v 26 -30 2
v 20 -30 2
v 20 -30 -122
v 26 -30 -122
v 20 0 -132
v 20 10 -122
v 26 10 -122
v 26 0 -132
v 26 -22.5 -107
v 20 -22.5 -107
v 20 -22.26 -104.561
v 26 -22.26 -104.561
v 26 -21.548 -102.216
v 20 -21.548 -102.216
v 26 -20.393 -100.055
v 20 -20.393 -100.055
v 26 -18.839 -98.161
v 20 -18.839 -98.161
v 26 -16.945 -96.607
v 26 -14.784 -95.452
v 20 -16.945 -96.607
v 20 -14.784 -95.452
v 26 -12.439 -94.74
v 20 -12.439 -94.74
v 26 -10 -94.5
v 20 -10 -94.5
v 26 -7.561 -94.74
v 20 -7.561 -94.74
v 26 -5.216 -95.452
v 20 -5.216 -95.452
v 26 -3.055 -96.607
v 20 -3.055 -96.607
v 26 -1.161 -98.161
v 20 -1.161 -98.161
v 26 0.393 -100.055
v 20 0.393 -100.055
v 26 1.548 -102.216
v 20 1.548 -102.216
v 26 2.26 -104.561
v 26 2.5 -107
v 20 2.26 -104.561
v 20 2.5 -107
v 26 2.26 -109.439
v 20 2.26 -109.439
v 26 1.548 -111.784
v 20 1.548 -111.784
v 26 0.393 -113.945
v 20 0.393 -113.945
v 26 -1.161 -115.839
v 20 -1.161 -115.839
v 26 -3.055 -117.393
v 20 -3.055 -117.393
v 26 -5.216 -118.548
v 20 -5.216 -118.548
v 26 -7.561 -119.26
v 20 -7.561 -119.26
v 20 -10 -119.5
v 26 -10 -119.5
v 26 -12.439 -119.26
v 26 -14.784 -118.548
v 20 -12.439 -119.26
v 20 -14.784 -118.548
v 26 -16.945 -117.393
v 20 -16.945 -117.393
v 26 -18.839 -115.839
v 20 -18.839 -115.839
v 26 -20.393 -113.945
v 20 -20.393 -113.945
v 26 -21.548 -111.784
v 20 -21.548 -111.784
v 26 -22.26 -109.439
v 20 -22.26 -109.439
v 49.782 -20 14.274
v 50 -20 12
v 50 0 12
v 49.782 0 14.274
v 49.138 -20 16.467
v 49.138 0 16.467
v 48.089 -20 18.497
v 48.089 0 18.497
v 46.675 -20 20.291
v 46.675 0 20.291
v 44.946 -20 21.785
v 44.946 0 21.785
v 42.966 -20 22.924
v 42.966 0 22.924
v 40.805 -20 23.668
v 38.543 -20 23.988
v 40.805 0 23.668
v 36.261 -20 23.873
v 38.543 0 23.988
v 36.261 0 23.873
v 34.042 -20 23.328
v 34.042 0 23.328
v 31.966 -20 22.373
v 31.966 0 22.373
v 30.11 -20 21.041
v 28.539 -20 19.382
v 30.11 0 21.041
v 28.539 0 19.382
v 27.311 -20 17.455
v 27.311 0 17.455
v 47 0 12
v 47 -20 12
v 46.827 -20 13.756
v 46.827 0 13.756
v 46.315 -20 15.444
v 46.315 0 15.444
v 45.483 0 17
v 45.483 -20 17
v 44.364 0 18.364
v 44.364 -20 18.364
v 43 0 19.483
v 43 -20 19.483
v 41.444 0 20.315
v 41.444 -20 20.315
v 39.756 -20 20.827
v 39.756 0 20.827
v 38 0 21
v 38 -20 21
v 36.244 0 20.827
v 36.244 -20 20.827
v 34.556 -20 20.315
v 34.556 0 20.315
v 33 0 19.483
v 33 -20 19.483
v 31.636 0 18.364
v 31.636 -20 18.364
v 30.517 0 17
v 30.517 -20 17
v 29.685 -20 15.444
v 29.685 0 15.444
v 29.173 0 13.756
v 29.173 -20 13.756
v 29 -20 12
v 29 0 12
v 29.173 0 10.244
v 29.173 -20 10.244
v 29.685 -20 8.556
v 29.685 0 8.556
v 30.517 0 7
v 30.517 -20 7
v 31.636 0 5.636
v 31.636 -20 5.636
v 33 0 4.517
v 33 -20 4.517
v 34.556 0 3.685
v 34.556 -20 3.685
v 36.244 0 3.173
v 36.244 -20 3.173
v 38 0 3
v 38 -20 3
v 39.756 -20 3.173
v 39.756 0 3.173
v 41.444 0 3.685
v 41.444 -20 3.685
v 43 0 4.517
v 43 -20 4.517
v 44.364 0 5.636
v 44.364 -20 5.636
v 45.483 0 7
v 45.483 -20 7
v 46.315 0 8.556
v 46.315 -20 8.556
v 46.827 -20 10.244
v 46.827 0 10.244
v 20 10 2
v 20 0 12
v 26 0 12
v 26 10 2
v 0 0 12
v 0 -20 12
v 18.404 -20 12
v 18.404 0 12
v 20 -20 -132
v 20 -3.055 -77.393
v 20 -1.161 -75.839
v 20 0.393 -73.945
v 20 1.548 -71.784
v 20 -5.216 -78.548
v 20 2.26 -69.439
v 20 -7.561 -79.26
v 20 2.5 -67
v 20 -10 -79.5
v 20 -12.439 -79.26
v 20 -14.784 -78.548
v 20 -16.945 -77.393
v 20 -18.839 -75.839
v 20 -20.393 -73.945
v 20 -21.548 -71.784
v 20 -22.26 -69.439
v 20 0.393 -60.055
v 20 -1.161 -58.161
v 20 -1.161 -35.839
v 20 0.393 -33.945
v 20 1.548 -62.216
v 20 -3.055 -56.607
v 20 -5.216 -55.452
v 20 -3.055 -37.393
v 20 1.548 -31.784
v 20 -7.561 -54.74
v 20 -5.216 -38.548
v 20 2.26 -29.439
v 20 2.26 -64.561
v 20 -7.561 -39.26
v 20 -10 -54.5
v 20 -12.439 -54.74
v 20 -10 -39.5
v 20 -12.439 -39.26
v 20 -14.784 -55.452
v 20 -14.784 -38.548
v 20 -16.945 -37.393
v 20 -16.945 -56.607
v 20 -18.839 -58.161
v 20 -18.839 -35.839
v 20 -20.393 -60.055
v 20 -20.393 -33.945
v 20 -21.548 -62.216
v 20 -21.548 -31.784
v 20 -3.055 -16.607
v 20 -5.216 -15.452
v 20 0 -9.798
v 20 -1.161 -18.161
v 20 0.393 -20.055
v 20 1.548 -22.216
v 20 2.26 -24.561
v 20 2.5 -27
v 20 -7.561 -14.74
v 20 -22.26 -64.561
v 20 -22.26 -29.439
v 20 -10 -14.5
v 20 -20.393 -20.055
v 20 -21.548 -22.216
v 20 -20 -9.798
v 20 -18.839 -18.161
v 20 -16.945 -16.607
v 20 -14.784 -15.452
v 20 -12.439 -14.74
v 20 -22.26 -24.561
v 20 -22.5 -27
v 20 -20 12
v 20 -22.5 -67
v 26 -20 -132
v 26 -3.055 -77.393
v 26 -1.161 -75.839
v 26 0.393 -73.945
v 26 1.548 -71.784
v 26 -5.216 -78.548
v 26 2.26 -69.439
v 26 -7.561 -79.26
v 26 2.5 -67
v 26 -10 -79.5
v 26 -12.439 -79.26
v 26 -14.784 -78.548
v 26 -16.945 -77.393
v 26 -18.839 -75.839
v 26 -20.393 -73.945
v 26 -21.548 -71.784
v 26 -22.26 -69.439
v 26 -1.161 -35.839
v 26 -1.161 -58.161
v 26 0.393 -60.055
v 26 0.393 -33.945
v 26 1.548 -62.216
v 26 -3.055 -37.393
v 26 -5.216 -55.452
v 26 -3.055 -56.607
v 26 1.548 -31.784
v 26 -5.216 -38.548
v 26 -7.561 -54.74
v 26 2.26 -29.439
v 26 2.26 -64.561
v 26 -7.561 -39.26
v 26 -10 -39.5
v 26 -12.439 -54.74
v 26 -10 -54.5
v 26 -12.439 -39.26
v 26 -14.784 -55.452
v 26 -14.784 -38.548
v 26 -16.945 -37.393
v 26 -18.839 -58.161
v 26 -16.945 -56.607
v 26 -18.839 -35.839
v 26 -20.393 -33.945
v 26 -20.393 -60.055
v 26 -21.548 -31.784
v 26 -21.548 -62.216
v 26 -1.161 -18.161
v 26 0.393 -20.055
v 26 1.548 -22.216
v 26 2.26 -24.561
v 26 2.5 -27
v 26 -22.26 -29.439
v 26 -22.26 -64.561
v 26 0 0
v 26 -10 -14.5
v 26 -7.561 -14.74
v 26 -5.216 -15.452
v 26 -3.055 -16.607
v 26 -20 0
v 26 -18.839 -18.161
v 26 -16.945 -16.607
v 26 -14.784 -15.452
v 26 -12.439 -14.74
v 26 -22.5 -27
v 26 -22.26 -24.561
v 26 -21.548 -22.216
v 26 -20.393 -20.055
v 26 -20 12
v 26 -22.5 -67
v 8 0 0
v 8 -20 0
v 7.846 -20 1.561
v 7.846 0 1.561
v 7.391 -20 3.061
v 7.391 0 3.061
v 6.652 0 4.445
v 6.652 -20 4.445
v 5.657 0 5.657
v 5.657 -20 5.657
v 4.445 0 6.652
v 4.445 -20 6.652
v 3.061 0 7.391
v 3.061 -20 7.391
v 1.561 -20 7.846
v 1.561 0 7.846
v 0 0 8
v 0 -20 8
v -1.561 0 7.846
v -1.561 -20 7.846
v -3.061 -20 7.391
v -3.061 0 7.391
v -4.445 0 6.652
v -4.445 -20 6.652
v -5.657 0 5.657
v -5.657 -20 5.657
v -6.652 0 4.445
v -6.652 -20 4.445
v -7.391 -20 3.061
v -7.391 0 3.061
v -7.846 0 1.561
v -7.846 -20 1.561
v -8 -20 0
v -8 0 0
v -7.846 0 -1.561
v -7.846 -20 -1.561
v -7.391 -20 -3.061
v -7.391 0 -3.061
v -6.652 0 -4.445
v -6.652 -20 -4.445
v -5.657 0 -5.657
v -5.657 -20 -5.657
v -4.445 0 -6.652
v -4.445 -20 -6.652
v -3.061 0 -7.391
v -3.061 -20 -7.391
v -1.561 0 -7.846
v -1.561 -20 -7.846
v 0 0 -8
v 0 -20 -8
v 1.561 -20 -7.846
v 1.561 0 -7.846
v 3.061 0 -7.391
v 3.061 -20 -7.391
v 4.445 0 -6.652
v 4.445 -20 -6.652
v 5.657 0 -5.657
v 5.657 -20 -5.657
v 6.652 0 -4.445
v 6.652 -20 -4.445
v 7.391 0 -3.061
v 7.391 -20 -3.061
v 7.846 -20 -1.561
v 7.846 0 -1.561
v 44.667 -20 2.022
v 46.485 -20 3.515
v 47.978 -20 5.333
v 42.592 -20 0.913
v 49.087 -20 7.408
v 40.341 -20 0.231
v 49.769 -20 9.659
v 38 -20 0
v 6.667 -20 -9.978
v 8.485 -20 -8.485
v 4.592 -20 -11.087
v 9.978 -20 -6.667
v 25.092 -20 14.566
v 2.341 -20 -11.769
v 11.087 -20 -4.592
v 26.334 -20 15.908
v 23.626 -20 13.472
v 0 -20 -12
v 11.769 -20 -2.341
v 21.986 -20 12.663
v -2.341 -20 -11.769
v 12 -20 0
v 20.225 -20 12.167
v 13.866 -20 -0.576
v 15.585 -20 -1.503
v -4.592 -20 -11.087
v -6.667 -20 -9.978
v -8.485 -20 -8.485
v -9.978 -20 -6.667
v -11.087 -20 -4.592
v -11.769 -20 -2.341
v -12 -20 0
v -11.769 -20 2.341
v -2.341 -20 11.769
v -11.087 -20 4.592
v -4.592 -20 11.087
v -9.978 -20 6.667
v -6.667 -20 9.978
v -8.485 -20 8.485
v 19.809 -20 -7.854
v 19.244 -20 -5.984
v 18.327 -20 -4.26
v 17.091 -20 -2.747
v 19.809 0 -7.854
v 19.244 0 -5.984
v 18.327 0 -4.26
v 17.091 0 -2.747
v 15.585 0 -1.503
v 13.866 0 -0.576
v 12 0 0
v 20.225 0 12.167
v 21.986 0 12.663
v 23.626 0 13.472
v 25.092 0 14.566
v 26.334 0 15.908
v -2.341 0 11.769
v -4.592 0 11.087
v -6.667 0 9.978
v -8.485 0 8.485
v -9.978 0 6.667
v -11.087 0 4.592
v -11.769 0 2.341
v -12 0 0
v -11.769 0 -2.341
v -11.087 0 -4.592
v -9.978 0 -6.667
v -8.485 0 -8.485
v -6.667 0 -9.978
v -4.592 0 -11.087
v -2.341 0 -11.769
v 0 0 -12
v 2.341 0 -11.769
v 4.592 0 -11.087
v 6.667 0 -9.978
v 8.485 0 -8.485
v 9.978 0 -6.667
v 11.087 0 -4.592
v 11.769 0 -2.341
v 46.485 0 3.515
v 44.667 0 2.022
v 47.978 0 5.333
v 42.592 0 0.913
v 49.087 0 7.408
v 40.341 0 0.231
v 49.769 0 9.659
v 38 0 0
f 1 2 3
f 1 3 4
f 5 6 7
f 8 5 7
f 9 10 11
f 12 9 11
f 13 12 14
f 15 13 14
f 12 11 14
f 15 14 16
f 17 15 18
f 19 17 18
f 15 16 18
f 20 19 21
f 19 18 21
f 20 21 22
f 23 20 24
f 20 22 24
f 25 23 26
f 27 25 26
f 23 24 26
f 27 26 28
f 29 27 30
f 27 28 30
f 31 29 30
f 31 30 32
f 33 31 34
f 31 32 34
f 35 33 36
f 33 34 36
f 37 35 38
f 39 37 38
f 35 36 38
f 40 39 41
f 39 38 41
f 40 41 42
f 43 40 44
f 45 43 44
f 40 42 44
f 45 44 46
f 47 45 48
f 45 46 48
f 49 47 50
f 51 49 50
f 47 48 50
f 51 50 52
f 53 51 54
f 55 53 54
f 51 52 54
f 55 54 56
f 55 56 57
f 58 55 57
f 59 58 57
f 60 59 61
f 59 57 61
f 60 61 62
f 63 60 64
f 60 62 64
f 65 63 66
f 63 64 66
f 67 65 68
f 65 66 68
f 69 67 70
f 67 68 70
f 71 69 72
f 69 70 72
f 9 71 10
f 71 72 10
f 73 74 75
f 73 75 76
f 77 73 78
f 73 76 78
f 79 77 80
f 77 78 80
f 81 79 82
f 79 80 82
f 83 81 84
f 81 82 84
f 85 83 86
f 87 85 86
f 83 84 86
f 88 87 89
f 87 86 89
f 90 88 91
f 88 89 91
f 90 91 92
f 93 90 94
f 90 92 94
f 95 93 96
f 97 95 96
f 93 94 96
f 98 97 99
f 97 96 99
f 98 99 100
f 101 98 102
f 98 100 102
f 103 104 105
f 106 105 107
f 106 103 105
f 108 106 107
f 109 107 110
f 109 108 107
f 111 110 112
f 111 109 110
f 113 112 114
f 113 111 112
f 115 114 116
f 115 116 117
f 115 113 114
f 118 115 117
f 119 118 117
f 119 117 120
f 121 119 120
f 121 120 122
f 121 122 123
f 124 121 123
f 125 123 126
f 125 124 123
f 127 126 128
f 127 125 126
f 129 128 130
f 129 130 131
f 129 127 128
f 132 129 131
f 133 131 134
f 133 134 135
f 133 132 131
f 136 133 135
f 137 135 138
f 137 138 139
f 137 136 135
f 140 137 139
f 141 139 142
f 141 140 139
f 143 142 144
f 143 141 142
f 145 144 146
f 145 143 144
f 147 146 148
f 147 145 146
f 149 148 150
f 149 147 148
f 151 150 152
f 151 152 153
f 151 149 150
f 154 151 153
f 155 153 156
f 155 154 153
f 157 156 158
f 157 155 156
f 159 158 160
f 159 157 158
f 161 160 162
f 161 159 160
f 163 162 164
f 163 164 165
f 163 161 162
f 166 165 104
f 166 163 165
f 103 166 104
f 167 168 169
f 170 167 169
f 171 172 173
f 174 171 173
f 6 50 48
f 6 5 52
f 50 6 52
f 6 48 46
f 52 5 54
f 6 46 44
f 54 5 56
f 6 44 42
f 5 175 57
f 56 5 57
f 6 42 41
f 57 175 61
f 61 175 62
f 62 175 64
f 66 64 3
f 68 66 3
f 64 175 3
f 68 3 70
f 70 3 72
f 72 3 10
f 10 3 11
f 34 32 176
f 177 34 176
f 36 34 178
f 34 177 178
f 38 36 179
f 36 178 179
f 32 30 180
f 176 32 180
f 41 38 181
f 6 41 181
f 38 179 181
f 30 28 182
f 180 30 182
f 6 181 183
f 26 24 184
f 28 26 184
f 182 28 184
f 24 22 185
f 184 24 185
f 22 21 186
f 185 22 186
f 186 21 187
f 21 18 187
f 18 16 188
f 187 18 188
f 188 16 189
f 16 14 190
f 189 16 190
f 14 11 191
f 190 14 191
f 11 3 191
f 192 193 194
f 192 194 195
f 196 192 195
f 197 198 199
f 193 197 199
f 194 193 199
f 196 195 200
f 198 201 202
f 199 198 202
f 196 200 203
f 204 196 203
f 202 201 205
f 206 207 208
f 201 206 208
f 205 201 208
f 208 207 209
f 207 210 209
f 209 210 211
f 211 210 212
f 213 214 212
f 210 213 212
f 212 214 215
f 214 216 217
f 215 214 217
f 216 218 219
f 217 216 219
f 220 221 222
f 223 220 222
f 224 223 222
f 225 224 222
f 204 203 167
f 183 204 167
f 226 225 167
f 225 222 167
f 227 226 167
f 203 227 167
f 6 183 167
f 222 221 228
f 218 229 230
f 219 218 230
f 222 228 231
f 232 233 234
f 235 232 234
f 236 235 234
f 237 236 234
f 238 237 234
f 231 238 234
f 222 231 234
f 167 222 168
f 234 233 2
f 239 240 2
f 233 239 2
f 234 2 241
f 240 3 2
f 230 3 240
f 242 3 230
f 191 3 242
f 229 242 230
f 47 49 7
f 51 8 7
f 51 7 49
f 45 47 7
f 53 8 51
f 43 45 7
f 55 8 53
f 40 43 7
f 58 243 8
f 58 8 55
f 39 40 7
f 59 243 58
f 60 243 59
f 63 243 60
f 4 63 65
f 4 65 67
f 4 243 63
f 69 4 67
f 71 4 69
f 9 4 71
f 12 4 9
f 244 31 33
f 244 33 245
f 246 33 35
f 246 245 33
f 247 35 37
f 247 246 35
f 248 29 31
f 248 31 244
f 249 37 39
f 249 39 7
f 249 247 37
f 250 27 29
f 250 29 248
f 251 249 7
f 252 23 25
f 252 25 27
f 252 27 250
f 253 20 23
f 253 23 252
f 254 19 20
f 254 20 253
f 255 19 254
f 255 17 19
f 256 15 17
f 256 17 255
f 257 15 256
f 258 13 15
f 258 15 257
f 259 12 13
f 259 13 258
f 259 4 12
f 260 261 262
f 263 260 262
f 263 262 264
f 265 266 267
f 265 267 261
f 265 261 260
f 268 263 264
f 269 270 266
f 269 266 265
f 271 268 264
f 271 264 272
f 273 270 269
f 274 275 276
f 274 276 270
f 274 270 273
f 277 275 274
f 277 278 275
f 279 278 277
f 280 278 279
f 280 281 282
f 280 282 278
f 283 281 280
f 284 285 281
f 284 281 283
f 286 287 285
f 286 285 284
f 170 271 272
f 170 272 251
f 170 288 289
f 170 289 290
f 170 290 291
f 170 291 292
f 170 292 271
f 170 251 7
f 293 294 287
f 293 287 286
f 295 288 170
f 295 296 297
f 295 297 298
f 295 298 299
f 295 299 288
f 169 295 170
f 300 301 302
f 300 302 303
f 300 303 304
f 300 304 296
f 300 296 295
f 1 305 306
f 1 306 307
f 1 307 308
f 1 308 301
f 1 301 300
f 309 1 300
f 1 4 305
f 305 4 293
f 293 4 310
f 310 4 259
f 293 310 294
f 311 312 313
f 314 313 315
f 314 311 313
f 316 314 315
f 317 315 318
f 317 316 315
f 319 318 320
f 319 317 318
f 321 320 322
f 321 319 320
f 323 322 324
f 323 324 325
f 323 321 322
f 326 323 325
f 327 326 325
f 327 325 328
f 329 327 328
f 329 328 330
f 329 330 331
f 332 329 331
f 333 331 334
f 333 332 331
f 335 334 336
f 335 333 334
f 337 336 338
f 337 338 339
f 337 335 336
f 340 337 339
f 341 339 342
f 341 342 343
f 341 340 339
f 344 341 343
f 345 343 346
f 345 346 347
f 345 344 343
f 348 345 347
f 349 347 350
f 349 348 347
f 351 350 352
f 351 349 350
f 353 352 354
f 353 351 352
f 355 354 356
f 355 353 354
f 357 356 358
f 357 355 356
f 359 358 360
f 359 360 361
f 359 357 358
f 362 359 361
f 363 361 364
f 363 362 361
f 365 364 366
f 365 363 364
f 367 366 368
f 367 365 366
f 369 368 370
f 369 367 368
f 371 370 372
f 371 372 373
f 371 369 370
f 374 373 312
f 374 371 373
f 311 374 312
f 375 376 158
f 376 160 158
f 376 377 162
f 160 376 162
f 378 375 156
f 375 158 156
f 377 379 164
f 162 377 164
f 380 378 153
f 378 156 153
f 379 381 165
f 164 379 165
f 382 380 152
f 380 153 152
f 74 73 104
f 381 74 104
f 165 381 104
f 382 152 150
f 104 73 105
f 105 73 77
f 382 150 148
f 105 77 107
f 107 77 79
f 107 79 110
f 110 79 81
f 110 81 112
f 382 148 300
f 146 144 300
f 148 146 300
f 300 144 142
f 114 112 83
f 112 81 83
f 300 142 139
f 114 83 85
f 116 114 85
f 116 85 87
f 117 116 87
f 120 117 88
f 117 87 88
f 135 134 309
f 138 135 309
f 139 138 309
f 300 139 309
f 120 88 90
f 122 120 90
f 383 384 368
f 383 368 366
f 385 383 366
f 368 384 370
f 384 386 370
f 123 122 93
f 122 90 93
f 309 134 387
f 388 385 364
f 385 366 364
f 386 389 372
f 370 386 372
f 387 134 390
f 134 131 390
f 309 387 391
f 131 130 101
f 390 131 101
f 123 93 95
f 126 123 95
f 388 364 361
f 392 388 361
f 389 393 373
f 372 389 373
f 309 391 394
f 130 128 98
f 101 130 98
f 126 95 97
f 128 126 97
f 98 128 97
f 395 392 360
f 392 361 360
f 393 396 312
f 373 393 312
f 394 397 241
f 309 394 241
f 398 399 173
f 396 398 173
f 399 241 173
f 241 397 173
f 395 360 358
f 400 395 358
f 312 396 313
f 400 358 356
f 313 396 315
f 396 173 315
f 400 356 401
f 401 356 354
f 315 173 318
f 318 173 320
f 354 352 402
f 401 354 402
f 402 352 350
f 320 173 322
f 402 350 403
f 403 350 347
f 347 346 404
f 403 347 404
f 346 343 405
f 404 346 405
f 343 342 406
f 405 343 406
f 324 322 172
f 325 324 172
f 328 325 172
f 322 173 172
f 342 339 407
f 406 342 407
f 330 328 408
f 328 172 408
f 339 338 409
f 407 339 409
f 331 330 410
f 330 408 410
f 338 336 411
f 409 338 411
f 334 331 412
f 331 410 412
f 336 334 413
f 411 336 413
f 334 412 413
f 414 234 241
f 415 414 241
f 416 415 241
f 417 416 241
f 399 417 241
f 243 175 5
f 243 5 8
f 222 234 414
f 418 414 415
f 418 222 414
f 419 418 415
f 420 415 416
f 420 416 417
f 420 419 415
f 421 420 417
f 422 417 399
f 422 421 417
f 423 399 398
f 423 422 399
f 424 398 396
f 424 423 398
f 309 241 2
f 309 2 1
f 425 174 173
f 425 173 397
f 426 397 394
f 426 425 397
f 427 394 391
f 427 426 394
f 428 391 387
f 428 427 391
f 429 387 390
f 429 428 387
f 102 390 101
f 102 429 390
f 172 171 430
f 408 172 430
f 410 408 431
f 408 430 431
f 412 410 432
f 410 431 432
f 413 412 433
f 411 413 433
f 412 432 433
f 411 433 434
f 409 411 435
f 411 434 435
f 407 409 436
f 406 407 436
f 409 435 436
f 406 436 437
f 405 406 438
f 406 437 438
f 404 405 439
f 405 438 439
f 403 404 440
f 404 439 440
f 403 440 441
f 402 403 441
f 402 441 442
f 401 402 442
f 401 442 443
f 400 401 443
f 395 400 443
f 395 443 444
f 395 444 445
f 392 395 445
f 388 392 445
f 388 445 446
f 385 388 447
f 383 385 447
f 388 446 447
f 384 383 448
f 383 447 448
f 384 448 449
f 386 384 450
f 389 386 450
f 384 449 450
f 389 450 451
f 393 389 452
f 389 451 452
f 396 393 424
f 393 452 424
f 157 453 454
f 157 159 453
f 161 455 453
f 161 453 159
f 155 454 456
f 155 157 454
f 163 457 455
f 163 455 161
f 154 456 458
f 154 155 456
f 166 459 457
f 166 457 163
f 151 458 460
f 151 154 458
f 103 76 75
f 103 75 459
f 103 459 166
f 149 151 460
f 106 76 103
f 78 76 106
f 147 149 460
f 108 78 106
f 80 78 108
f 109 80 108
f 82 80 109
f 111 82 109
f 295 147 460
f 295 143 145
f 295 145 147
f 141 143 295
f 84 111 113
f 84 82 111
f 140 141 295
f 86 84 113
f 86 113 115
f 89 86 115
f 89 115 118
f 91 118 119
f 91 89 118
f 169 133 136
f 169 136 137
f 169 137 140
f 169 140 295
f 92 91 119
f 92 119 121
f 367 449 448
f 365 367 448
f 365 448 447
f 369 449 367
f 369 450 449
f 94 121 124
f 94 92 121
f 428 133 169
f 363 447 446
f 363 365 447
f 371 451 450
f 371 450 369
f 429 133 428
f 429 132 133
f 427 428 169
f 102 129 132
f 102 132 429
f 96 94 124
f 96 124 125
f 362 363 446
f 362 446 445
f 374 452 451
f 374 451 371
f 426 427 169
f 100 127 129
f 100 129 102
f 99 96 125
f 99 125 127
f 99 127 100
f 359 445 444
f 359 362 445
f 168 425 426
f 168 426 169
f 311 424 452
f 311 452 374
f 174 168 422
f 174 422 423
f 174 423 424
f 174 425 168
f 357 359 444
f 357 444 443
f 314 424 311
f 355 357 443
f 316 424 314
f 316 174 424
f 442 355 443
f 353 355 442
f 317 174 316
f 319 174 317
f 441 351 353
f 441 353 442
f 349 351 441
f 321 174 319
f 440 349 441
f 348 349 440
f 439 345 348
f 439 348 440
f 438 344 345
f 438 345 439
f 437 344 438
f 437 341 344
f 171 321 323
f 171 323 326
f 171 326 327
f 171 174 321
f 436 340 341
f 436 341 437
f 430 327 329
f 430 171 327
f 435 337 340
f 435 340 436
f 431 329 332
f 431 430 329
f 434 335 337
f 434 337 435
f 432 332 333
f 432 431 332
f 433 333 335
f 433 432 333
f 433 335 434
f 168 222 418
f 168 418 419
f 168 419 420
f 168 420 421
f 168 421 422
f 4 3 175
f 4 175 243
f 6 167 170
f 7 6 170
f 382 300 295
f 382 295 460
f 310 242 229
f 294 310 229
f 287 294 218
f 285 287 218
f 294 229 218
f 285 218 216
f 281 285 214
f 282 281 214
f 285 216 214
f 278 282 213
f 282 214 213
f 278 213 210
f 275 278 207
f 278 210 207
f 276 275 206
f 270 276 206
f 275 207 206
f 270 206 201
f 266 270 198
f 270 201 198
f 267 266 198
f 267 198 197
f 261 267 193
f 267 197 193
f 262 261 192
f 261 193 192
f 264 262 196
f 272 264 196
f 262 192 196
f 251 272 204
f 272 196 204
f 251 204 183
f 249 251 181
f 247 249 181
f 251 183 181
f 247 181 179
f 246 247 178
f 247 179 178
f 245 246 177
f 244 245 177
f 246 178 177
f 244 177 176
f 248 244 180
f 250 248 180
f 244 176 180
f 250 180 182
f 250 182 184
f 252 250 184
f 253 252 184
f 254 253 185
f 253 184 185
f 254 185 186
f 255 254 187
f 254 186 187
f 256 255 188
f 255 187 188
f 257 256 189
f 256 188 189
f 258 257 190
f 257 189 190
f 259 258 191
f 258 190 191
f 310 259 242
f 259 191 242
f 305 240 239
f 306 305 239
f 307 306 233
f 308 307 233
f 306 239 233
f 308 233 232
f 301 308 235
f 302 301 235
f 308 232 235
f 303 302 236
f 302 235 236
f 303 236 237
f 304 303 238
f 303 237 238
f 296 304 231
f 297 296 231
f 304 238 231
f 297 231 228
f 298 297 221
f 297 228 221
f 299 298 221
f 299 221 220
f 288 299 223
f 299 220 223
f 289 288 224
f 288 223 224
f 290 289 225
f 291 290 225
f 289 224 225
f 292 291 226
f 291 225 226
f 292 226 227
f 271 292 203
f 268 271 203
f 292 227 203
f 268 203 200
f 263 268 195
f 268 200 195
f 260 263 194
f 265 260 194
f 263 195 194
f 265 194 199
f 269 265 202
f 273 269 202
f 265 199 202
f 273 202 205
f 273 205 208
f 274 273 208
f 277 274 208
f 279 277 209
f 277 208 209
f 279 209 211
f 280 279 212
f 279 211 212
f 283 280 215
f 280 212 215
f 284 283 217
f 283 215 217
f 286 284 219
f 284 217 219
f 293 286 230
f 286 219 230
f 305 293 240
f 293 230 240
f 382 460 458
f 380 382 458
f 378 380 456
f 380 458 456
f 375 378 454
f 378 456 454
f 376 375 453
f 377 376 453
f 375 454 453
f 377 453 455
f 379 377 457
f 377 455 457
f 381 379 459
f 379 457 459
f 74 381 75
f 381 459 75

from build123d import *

# Parameters (mm, degrees)
F0_R          = 8
F0_R_2        = 9
F1_DEPTH      = 20
F2_W          = 6
F2_H          = 144
F3_DEPTH      = 10
F3_DEPTH_BACK = 30
F4_SIZE       = 10
F5_T1_DEPTH   = 20
F6_R          = 12.5
F7_DEPTH      = 6


# Not quite as in the source:
# - a fillet or chamfer that OpenCascade refuses, or shapes differently, is made with other operations: its cross-section is extruded or revolved along the edge and cut away or added


with BuildPart() as f1:
    # F0 (on Front) → F1 (new body)
    with BuildSketch(Plane.XZ):
        with BuildLine():
            ThreePointArc((0, 12), (-8.4852813742, -8.4852813742), (12, 0))
            ThreePointArc((12, 0), (8.4852813742, 8.4852813742), (0, 12))
        make_face()
        Circle(F0_R, mode=Mode.SUBTRACT)
        with BuildLine():
            ThreePointArc((0, 12), (8.4852813742, 8.4852813742), (12, 0))
            Line((12, 0), (38, 0))
            ThreePointArc((38, 0), (29.5147186258, 3.5147186258), (26, 12))
            Line((26, 12), (0, 12))
        make_face()
        with BuildLine():
            ThreePointArc((26, 12), (29.5147186258, 3.5147186258), (38, 0))
            ThreePointArc((38, 0), (46.4852813742, 3.5147186258), (50, 12))
            ThreePointArc((50, 12), (38, 24), (26, 12))
        make_face()
        with Locations((38, 12)):
            Circle(F0_R_2, mode=Mode.SUBTRACT)
    extrude(amount=F1_DEPTH)

    # F2 (on face) → F3 (join, two sides)
    with BuildSketch(Plane.XZ.offset(20)) as f3_sk:
        with Locations((23, -60)):
            Rectangle(F2_W, F2_H)
    extrude(amount=F3_DEPTH)
    extrude(f3_sk.sketch, amount=-F3_DEPTH_BACK)

    # F4
    f4_edges = [f1.edges().sort_by_distance(p)[0] for p in [
        (23, -30, 12),
        (23, 10, 12),
        (23, -30, -132),
        (23, 10, -132),
    ]]
    chamfer(f4_edges, length=F4_SIZE)

    # F5: fillet of radius 10 on 2 edges, made by hand

    # F5_s2 → F5_t1 (join)
    with BuildSketch(Plane.XZ):
        with BuildLine():
            ThreePointArc((18.4040820577, 12), (23.6264117364, 13.4719713458), (27.311317486, 17.4545454545))
            ThreePointArc((27.311317486, 17.4545454545), (26.3324340549, 14.8049785946), (26, 12))
            Line((26, 12), (18.4040820577, 12))
        make_face()
        with BuildLine():
            ThreePointArc((20, -9.7979589711), (17.7459666924, -3.4734036508), (12, 0))
            Line((12, 0), (20, 0))
            Line((20, 0), (20, -9.7979589711))
        make_face()
    extrude(amount=F5_T1_DEPTH)

    # F6 (on face) → F7 (cut, through all)
    with BuildSketch(Plane(origin=(20, 0, 0), x_dir=(0, -1, 0), z_dir=(-1, 0, 0))):
        with Locations((10, -107)):
            Circle(F6_R)
        with Locations((10, -67)):
            Circle(F6_R)
        with Locations((10, -27)):
            Circle(F6_R)
    extrude(amount=-F7_DEPTH, mode=Mode.SUBTRACT)


solid = f1.part
